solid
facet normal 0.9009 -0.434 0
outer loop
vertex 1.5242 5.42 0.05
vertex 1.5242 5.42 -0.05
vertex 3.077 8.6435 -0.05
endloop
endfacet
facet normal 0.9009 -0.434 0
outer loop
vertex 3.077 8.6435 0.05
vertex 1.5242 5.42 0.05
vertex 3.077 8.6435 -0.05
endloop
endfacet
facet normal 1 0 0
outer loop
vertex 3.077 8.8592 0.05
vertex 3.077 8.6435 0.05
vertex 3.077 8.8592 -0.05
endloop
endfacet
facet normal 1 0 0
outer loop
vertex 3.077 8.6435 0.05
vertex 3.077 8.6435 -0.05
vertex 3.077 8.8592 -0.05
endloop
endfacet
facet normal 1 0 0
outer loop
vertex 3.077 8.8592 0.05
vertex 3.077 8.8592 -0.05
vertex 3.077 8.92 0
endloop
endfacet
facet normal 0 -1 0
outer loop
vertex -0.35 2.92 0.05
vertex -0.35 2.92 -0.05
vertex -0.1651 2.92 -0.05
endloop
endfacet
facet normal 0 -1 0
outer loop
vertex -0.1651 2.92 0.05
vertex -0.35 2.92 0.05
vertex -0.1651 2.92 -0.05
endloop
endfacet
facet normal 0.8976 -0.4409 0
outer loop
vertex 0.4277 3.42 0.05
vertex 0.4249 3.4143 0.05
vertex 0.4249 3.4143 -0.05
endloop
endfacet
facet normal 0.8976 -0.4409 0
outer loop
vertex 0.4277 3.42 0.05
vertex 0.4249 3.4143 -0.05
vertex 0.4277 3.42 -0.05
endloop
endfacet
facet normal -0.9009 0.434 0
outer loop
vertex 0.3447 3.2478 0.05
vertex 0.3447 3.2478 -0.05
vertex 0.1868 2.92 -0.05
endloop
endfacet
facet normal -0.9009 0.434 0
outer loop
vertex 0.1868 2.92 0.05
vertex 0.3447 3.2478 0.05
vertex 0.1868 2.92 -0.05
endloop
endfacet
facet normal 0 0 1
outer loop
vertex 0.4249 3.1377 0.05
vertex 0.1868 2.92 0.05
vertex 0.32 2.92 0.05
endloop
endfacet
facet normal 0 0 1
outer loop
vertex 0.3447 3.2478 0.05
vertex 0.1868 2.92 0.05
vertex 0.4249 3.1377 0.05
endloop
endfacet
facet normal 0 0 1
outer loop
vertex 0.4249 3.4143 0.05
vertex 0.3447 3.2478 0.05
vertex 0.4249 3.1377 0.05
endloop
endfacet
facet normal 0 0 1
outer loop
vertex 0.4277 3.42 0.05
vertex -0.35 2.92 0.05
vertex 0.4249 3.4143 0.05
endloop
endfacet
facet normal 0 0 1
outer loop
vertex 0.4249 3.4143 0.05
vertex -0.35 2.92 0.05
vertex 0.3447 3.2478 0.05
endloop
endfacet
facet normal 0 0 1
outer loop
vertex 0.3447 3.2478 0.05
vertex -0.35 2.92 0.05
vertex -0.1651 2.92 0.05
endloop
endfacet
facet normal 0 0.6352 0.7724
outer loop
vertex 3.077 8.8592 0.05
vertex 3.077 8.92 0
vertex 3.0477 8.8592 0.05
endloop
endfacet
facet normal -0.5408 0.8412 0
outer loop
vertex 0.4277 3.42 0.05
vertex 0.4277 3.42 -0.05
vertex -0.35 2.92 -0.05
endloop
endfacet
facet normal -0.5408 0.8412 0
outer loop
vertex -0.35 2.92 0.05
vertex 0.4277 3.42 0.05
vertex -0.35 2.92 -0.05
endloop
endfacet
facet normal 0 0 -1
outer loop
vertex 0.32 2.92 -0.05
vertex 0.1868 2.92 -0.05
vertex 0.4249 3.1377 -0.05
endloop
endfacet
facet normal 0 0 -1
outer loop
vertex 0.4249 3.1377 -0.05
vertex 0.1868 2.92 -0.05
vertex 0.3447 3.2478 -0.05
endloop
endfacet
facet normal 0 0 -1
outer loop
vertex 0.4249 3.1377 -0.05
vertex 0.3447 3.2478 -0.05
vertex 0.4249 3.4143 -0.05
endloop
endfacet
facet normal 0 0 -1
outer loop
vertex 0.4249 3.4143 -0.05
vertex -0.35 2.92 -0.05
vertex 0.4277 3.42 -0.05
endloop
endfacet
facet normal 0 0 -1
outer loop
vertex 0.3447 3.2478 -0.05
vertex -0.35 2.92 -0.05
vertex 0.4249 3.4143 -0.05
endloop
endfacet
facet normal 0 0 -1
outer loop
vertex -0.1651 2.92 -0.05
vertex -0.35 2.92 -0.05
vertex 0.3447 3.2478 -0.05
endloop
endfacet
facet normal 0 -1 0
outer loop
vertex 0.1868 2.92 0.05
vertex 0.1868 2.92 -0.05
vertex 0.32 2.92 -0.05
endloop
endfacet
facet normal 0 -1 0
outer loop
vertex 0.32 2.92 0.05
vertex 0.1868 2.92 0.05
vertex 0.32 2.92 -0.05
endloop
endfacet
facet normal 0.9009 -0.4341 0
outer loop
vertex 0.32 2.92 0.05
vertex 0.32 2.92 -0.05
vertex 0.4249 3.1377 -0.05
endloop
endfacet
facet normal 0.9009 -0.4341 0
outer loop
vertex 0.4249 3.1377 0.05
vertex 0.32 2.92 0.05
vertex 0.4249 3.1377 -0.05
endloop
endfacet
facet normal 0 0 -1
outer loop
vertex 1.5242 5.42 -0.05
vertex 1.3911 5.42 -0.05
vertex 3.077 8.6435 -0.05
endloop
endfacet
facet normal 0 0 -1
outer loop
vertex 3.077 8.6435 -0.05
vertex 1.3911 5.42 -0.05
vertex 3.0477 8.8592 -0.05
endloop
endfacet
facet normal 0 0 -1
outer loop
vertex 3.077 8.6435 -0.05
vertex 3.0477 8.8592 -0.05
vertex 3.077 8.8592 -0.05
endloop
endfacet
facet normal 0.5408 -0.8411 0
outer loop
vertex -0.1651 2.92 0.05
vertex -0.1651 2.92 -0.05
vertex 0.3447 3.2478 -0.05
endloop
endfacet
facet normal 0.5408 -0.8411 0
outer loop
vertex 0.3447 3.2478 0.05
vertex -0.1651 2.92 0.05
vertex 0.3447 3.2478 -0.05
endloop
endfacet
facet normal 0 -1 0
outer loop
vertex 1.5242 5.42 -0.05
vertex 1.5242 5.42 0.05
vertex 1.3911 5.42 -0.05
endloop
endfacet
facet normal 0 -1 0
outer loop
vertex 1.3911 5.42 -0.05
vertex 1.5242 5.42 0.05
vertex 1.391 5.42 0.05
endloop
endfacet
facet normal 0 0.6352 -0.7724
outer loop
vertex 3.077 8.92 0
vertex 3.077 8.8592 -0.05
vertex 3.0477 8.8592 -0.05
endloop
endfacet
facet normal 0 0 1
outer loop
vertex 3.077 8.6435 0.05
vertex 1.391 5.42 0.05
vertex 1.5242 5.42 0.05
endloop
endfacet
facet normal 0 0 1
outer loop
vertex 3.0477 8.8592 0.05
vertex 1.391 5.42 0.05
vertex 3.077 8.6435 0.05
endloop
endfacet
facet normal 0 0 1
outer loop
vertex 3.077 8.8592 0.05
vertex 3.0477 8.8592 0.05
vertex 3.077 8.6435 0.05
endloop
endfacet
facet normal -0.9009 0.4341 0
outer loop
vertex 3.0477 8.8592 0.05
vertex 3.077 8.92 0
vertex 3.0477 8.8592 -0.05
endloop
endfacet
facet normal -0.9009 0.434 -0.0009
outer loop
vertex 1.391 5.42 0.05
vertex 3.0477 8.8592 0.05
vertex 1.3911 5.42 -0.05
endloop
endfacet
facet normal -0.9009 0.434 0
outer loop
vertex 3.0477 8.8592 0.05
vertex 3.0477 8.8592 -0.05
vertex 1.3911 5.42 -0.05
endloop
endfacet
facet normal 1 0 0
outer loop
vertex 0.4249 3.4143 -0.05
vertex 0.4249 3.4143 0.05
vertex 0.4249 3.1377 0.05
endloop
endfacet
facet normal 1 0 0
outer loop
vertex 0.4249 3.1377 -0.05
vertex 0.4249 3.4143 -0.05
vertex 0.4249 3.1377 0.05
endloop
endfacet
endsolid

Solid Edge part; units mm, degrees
sketch "Sketch1" plane through (0, 0, 0) normal (0, 0, 1) x (1, 0, 0)
  line L0 (0.1868, 2.92) -> (0.32, 2.92)
  line L1 (0.32, 2.92) -> (3.077, 8.6435)
  line L2 (3.077, 8.6435) -> (3.077, 8.92)
  line L3 (3.077, 8.92) -> (0.1868, 2.92)
  dimension "D1" = 0.12
  dimension "D2" = 6
extrude "Protrusion1" add sketch "Sketch1" along normal mid plane 0.1
sketch "Sketch2" plane through (0, 0, 0) normal (0, 0, 1) x (1, 0, 0)
  line L0 (0.4277, 3.42) -> (-0.35, 2.92)
  line L1 (-0.35, 2.92) -> (-0.1651, 2.92)
  line L2 (-0.1651, 2.92) -> (0.3447, 3.2478)
  line L3 (0.4277, 3.42) -> (0.3447, 3.2478)
  dimension "D1" = 0.1
  dimension "D2" = 0.1
  dimension "D3" = 0.5
extrude "Ausprägung_2" add sketch "Sketch2" along normal mid plane 0.1
sketch "Sketch3" plane through (3.077, 8.7598, 0) normal (1, 0, 0) x (0, 0, -1)
  line L0 (0.05, 0.0994) -> (0, 0.1602)
  line L1 (0, 0.1602) -> (-0.05, 0.0994)
  line L2 (-0.05, 0.1966) -> (-0.05, 0.0994)
  line L3 (-0.05, 0.1966) -> (0.05, 0.1966)
  line L4 (0.05, 0.1966) -> (0.05, 0.0994)
extrude "Cutout1" cut sketch "Sketch3" against normal through all
sketch "Sketch4" plane through (1.3635, 5.8896, 0.05) normal (0, 0, 1) x (0.4339736, 0.9009256, 0)
  line L0 (-2.6374, -0.2286) -> (-2.8866, -0.3486)
  line L1 (-2.8866, -0.3486) -> (-0.3533, -0.3486)
  line L2 (-0.3533, -0.3486) -> (-0.4111, -0.2286)
  line L3 (-2.6374, -0.2286) -> (-0.4111, -0.2286)
extrude "Cutout2" cut sketch "Sketch4" against normal through all
